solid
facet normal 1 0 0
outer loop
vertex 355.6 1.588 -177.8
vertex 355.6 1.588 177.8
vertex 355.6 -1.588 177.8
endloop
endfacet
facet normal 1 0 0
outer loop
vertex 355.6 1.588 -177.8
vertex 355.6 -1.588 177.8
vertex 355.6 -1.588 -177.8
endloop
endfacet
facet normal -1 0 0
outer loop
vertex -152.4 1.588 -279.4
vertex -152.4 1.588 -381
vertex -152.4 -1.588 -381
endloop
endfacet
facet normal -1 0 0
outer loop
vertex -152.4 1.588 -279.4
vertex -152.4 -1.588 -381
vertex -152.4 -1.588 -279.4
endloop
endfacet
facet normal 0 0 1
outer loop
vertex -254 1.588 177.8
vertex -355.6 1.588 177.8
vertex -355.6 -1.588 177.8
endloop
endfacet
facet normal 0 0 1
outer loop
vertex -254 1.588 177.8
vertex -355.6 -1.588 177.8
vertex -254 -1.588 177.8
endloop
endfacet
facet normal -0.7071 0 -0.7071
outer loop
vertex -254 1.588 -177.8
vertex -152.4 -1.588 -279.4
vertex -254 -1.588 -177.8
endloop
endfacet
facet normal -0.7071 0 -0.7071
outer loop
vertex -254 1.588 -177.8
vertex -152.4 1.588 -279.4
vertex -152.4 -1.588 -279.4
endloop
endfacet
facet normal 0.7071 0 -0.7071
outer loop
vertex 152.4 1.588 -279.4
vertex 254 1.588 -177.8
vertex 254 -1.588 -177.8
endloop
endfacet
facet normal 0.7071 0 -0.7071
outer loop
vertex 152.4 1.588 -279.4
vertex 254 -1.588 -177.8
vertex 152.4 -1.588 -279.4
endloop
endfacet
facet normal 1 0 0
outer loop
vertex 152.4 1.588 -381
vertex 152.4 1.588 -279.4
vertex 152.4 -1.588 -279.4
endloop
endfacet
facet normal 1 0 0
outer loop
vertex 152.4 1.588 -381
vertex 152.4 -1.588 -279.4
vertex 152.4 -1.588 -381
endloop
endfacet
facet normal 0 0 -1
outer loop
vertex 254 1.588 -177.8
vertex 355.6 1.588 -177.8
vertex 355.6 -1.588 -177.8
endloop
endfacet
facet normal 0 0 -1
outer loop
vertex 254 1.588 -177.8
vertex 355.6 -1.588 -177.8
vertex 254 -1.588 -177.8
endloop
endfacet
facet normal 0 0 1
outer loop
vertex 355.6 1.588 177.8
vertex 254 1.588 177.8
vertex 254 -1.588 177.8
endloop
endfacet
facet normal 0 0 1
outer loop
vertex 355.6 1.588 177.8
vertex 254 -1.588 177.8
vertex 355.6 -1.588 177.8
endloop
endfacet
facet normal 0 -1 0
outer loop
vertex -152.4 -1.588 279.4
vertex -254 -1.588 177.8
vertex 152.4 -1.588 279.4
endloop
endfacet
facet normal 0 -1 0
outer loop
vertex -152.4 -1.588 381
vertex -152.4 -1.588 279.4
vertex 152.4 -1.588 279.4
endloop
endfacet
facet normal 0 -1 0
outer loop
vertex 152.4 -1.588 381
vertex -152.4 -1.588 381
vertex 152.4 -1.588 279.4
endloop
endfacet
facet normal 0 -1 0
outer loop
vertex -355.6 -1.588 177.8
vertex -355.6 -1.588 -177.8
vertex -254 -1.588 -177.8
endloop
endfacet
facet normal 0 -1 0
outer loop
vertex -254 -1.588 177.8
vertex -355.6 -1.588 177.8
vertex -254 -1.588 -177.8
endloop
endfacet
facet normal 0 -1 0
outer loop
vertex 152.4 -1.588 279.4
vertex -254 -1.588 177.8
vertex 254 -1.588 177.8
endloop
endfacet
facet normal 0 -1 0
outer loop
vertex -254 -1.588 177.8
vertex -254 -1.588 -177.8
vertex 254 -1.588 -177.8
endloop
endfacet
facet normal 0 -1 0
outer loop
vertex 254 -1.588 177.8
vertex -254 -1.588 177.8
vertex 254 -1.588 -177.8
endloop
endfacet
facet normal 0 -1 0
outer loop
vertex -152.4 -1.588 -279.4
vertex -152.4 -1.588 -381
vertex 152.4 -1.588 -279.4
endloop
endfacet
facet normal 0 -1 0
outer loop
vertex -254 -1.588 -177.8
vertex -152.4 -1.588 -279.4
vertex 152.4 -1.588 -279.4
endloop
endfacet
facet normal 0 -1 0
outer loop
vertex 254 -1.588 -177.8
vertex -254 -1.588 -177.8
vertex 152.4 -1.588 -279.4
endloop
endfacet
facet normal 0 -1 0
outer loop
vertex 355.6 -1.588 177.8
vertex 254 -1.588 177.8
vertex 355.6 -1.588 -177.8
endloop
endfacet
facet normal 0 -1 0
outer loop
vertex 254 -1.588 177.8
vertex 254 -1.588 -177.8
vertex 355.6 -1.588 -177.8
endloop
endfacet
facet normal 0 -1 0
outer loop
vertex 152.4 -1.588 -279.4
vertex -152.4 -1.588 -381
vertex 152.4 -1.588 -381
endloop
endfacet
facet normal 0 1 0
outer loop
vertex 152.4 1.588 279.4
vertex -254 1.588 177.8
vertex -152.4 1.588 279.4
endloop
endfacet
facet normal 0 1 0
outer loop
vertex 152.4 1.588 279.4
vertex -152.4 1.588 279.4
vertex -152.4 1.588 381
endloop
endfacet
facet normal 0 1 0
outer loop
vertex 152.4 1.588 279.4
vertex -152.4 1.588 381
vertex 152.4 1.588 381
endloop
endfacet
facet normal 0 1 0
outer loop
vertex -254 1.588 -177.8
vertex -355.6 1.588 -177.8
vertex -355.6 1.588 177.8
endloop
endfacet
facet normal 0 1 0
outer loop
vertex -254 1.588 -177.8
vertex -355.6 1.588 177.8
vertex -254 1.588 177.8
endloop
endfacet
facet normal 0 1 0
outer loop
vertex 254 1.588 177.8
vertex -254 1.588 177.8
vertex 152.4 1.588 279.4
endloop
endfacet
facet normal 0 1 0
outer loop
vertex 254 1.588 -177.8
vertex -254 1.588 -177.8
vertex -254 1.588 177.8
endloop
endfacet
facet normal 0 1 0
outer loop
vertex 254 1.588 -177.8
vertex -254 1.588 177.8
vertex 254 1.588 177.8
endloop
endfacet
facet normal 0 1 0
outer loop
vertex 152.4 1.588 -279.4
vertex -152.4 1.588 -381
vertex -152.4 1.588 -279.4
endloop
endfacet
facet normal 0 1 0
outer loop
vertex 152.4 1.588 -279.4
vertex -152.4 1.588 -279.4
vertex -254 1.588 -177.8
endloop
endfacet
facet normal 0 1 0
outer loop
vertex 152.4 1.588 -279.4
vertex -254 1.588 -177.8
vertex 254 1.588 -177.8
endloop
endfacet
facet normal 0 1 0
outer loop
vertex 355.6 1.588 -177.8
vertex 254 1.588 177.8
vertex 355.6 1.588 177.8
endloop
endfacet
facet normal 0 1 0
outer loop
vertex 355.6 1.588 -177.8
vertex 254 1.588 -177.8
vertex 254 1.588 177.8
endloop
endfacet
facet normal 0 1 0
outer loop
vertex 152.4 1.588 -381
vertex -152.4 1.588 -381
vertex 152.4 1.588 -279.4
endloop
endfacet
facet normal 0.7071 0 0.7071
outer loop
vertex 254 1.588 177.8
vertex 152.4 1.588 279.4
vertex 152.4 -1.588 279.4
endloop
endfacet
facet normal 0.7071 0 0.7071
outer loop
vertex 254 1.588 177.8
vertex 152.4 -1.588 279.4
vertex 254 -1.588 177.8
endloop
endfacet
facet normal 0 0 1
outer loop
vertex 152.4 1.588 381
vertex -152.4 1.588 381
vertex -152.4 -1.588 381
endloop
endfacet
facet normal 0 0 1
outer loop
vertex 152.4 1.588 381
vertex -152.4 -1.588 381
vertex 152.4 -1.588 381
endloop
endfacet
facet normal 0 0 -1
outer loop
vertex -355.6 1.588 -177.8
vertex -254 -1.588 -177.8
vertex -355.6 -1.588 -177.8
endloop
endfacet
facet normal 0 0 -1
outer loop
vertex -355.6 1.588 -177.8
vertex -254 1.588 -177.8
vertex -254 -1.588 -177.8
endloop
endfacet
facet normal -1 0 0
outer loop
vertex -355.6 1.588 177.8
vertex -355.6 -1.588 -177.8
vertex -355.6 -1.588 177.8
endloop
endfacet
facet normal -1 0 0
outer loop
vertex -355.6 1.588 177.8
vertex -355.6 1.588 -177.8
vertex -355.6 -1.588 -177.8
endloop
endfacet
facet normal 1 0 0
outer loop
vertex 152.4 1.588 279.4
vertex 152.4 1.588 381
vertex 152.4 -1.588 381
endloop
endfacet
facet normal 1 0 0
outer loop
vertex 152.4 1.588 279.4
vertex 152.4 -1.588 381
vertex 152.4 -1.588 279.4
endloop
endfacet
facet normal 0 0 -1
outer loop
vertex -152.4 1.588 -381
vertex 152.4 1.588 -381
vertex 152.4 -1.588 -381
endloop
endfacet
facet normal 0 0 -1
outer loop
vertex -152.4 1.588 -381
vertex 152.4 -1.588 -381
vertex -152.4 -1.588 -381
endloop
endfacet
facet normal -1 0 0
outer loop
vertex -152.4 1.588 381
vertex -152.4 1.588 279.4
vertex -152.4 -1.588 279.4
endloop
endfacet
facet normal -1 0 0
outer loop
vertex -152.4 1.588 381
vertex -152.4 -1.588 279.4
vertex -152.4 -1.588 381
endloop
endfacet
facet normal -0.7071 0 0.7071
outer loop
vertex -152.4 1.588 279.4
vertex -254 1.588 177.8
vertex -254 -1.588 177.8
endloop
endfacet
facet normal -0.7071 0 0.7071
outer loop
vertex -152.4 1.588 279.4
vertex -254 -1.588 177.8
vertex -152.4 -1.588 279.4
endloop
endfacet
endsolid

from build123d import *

# Parameters (mm, degrees)
SKETCH1_W           = 304.8
SKETCH1_H           = 355.6
BOSS_EXTRUDE1_DEPTH = 1.5875


with BuildPart() as part:
    # Sketch1 → Boss-Extrude1 (new, symmetric)
    with BuildSketch(Plane(origin=(0, 0, 0), x_dir=(1, 0, 0), z_dir=(0, 1, 0))):
        Polygon((-152.4, -177.8), (-152.4, 177.8), (-254, 177.8), (-355.6, 177.8), (-355.6, -177.8), (-254, -177.8), align=None)
        Rectangle(SKETCH1_W, SKETCH1_H)
        Polygon((152.4, 177.8), (152.4, 279.4), (152.4, 381), (-152.4, 381), (-152.4, 279.4), (-152.4, 177.8), align=None)
        Polygon((152.4, -279.4), (152.4, -177.8), (-152.4, -177.8), (-152.4, -279.4), (-152.4, -381), (152.4, -381), align=None)
        Polygon((355.6, 177.8), (254, 177.8), (152.4, 177.8), (152.4, -177.8), (254, -177.8), (355.6, -177.8), align=None)
        Polygon((152.4, 177.8), (254, 177.8), (152.4, 279.4), align=None)
        Polygon((254, -177.8), (152.4, -177.8), (152.4, -279.4), align=None)
        Polygon((-152.4, -279.4), (-152.4, -177.8), (-254, -177.8), align=None)
        Polygon((-254, 177.8), (-152.4, 177.8), (-152.4, 279.4), align=None)
    extrude(amount=BOSS_EXTRUDE1_DEPTH, both=True)


solid = part.part
